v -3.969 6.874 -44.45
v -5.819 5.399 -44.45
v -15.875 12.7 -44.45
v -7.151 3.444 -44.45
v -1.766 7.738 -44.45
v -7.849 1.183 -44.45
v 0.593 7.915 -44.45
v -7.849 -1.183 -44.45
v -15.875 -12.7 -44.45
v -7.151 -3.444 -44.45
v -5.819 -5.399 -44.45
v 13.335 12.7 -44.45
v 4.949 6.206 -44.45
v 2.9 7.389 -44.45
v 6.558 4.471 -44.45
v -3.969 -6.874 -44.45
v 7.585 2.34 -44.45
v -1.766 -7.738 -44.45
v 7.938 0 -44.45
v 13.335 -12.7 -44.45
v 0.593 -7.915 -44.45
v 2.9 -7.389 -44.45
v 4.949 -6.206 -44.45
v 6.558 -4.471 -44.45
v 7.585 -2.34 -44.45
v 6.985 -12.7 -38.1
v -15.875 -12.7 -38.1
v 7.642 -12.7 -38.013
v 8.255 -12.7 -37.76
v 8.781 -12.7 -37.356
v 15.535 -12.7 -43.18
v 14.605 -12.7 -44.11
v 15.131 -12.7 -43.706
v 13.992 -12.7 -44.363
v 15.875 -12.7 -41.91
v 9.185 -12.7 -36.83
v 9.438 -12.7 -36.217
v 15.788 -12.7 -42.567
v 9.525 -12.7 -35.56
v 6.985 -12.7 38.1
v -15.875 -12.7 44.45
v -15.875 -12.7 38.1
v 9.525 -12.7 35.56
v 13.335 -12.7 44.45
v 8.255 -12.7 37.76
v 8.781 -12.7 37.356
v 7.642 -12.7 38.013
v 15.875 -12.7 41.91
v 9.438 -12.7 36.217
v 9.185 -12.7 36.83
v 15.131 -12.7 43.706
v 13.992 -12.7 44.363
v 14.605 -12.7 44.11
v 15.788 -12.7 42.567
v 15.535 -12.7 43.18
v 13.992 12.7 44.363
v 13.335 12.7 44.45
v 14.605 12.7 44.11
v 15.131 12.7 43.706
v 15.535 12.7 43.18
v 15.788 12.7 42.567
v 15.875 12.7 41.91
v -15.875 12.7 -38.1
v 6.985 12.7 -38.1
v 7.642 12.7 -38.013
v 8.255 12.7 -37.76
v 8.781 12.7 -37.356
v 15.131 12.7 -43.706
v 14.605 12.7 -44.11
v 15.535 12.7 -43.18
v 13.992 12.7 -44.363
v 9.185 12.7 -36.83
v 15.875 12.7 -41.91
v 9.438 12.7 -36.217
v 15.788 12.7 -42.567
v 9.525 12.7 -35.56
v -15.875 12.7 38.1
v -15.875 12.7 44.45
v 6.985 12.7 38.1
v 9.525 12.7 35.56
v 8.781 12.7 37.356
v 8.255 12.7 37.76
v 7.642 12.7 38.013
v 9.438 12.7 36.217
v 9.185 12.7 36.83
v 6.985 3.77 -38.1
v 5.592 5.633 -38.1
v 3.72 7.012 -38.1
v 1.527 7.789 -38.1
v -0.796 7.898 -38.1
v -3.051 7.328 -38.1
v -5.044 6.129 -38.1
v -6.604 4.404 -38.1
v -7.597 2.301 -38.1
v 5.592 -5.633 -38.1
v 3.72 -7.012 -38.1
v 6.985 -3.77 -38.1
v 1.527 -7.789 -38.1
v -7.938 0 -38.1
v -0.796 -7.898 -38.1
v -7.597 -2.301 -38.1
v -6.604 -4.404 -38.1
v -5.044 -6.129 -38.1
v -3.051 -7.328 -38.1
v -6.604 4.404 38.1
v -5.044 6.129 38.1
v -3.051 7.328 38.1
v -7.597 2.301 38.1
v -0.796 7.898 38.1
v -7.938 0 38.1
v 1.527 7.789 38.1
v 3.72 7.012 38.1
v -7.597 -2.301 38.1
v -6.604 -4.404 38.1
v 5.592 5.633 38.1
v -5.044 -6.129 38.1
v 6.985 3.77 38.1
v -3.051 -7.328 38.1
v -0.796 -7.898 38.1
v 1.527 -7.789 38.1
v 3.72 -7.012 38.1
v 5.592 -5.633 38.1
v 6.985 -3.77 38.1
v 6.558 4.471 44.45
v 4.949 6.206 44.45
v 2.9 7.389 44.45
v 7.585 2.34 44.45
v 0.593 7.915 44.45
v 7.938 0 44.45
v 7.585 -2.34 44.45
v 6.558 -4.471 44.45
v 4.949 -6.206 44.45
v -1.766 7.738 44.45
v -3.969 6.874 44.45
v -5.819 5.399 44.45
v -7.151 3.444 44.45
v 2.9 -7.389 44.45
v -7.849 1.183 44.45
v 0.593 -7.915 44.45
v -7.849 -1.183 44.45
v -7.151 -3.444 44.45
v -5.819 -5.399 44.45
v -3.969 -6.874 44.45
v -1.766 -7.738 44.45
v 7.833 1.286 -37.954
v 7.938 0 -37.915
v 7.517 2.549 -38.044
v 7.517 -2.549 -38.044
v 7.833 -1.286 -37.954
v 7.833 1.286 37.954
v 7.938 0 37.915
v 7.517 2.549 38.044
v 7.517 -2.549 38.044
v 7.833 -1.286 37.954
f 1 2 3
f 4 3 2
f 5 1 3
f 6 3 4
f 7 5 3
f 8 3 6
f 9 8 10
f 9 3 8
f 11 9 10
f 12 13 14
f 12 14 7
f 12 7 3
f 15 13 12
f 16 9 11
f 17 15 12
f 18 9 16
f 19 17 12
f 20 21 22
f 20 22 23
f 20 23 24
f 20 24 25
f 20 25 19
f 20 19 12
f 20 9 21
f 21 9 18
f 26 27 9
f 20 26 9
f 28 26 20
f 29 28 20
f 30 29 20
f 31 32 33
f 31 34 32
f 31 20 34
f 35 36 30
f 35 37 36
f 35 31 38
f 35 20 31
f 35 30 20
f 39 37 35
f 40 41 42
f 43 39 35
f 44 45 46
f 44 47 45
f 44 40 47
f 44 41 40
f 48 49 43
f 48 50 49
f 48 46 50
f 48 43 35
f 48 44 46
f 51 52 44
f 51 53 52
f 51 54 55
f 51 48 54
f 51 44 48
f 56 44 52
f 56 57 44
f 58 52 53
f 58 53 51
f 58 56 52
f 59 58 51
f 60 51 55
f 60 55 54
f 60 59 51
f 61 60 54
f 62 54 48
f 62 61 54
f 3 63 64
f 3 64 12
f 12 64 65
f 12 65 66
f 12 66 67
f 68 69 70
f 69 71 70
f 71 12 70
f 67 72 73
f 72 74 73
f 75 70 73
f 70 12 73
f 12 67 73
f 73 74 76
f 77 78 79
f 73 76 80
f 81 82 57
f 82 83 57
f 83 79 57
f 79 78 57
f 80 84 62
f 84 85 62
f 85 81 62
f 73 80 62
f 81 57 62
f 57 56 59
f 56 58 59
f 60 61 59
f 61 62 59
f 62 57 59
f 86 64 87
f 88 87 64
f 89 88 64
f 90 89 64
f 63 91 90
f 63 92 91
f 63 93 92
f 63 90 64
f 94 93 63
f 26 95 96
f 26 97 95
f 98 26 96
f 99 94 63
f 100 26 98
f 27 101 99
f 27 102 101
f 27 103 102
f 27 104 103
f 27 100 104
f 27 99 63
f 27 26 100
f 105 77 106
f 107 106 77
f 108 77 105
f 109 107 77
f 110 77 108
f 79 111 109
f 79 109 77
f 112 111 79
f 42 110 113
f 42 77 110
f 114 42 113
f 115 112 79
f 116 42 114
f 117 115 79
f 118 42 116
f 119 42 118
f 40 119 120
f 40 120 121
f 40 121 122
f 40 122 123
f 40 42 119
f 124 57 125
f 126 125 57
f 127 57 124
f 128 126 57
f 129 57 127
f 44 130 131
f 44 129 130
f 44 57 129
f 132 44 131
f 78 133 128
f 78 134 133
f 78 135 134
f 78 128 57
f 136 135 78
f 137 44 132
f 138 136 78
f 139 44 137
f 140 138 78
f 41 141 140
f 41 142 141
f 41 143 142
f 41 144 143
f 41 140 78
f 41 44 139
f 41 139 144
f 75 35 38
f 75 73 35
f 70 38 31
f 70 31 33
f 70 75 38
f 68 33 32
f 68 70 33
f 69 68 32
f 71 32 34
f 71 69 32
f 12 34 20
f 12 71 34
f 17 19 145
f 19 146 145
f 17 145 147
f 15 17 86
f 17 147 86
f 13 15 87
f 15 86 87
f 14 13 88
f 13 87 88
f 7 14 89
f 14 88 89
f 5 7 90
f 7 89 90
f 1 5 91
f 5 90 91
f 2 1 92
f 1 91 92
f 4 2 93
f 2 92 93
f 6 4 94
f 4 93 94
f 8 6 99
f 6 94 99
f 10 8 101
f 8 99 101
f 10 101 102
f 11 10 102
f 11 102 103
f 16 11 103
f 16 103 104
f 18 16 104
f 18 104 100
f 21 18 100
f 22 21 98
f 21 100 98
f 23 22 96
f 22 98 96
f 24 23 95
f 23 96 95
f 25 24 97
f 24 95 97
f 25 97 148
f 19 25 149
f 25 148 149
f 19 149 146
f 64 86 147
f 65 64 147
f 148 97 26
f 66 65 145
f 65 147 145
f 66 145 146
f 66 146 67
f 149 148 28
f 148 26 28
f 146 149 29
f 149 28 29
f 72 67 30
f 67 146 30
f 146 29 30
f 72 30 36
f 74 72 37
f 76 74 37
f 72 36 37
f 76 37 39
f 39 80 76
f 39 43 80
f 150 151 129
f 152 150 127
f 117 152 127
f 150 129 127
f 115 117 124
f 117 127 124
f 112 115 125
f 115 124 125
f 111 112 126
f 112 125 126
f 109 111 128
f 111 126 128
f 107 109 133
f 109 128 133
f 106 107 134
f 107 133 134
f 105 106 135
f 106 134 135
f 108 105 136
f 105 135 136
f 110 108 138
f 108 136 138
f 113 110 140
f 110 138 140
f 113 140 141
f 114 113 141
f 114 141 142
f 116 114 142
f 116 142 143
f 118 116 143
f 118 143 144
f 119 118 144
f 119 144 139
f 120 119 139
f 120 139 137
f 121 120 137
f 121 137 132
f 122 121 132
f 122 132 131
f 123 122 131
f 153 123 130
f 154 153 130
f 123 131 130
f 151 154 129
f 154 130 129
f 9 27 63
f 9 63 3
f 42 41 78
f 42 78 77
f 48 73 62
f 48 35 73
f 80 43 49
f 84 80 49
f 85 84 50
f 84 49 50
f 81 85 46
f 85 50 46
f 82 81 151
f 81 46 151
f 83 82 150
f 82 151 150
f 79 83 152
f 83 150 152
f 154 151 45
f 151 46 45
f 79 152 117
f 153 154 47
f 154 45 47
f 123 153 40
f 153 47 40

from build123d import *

# Parameters (mm, degrees)
F1_DEPTH = 12.7
F2_R     = 2.54
F3_R     = 7.9375
F4_DEPTH = 127


with BuildPart() as f1:
    # F0 (on Front) → F1 (new body, symmetric)
    with BuildSketch(Plane.XZ):
        Polygon((15.875, 44.45), (-15.875, 44.45), (-15.875, 38.1), (9.525, 38.1), (9.525, -38.1), (-15.875, -38.1), (-15.875, -44.45), (15.875, -44.45), align=None)
    extrude(amount=F1_DEPTH, both=True)

    # F2
    f2_edges = [f1.edges().sort_by_distance(p)[0] for p in [
        (15.875, 0, 44.45),
        (15.875, 0, -44.45),
        (9.525, 0, 38.1),
        (9.525, 0, -38.1),
    ]]
    fillet(f2_edges, radius=F2_R)

    # F3 (on face) → F4 (cut, symmetric)
    with BuildSketch(Plane.XY.offset(44.45)):
        Circle(F3_R)
    extrude(amount=F4_DEPTH, both=True, mode=Mode.SUBTRACT)


solid = f1.part
